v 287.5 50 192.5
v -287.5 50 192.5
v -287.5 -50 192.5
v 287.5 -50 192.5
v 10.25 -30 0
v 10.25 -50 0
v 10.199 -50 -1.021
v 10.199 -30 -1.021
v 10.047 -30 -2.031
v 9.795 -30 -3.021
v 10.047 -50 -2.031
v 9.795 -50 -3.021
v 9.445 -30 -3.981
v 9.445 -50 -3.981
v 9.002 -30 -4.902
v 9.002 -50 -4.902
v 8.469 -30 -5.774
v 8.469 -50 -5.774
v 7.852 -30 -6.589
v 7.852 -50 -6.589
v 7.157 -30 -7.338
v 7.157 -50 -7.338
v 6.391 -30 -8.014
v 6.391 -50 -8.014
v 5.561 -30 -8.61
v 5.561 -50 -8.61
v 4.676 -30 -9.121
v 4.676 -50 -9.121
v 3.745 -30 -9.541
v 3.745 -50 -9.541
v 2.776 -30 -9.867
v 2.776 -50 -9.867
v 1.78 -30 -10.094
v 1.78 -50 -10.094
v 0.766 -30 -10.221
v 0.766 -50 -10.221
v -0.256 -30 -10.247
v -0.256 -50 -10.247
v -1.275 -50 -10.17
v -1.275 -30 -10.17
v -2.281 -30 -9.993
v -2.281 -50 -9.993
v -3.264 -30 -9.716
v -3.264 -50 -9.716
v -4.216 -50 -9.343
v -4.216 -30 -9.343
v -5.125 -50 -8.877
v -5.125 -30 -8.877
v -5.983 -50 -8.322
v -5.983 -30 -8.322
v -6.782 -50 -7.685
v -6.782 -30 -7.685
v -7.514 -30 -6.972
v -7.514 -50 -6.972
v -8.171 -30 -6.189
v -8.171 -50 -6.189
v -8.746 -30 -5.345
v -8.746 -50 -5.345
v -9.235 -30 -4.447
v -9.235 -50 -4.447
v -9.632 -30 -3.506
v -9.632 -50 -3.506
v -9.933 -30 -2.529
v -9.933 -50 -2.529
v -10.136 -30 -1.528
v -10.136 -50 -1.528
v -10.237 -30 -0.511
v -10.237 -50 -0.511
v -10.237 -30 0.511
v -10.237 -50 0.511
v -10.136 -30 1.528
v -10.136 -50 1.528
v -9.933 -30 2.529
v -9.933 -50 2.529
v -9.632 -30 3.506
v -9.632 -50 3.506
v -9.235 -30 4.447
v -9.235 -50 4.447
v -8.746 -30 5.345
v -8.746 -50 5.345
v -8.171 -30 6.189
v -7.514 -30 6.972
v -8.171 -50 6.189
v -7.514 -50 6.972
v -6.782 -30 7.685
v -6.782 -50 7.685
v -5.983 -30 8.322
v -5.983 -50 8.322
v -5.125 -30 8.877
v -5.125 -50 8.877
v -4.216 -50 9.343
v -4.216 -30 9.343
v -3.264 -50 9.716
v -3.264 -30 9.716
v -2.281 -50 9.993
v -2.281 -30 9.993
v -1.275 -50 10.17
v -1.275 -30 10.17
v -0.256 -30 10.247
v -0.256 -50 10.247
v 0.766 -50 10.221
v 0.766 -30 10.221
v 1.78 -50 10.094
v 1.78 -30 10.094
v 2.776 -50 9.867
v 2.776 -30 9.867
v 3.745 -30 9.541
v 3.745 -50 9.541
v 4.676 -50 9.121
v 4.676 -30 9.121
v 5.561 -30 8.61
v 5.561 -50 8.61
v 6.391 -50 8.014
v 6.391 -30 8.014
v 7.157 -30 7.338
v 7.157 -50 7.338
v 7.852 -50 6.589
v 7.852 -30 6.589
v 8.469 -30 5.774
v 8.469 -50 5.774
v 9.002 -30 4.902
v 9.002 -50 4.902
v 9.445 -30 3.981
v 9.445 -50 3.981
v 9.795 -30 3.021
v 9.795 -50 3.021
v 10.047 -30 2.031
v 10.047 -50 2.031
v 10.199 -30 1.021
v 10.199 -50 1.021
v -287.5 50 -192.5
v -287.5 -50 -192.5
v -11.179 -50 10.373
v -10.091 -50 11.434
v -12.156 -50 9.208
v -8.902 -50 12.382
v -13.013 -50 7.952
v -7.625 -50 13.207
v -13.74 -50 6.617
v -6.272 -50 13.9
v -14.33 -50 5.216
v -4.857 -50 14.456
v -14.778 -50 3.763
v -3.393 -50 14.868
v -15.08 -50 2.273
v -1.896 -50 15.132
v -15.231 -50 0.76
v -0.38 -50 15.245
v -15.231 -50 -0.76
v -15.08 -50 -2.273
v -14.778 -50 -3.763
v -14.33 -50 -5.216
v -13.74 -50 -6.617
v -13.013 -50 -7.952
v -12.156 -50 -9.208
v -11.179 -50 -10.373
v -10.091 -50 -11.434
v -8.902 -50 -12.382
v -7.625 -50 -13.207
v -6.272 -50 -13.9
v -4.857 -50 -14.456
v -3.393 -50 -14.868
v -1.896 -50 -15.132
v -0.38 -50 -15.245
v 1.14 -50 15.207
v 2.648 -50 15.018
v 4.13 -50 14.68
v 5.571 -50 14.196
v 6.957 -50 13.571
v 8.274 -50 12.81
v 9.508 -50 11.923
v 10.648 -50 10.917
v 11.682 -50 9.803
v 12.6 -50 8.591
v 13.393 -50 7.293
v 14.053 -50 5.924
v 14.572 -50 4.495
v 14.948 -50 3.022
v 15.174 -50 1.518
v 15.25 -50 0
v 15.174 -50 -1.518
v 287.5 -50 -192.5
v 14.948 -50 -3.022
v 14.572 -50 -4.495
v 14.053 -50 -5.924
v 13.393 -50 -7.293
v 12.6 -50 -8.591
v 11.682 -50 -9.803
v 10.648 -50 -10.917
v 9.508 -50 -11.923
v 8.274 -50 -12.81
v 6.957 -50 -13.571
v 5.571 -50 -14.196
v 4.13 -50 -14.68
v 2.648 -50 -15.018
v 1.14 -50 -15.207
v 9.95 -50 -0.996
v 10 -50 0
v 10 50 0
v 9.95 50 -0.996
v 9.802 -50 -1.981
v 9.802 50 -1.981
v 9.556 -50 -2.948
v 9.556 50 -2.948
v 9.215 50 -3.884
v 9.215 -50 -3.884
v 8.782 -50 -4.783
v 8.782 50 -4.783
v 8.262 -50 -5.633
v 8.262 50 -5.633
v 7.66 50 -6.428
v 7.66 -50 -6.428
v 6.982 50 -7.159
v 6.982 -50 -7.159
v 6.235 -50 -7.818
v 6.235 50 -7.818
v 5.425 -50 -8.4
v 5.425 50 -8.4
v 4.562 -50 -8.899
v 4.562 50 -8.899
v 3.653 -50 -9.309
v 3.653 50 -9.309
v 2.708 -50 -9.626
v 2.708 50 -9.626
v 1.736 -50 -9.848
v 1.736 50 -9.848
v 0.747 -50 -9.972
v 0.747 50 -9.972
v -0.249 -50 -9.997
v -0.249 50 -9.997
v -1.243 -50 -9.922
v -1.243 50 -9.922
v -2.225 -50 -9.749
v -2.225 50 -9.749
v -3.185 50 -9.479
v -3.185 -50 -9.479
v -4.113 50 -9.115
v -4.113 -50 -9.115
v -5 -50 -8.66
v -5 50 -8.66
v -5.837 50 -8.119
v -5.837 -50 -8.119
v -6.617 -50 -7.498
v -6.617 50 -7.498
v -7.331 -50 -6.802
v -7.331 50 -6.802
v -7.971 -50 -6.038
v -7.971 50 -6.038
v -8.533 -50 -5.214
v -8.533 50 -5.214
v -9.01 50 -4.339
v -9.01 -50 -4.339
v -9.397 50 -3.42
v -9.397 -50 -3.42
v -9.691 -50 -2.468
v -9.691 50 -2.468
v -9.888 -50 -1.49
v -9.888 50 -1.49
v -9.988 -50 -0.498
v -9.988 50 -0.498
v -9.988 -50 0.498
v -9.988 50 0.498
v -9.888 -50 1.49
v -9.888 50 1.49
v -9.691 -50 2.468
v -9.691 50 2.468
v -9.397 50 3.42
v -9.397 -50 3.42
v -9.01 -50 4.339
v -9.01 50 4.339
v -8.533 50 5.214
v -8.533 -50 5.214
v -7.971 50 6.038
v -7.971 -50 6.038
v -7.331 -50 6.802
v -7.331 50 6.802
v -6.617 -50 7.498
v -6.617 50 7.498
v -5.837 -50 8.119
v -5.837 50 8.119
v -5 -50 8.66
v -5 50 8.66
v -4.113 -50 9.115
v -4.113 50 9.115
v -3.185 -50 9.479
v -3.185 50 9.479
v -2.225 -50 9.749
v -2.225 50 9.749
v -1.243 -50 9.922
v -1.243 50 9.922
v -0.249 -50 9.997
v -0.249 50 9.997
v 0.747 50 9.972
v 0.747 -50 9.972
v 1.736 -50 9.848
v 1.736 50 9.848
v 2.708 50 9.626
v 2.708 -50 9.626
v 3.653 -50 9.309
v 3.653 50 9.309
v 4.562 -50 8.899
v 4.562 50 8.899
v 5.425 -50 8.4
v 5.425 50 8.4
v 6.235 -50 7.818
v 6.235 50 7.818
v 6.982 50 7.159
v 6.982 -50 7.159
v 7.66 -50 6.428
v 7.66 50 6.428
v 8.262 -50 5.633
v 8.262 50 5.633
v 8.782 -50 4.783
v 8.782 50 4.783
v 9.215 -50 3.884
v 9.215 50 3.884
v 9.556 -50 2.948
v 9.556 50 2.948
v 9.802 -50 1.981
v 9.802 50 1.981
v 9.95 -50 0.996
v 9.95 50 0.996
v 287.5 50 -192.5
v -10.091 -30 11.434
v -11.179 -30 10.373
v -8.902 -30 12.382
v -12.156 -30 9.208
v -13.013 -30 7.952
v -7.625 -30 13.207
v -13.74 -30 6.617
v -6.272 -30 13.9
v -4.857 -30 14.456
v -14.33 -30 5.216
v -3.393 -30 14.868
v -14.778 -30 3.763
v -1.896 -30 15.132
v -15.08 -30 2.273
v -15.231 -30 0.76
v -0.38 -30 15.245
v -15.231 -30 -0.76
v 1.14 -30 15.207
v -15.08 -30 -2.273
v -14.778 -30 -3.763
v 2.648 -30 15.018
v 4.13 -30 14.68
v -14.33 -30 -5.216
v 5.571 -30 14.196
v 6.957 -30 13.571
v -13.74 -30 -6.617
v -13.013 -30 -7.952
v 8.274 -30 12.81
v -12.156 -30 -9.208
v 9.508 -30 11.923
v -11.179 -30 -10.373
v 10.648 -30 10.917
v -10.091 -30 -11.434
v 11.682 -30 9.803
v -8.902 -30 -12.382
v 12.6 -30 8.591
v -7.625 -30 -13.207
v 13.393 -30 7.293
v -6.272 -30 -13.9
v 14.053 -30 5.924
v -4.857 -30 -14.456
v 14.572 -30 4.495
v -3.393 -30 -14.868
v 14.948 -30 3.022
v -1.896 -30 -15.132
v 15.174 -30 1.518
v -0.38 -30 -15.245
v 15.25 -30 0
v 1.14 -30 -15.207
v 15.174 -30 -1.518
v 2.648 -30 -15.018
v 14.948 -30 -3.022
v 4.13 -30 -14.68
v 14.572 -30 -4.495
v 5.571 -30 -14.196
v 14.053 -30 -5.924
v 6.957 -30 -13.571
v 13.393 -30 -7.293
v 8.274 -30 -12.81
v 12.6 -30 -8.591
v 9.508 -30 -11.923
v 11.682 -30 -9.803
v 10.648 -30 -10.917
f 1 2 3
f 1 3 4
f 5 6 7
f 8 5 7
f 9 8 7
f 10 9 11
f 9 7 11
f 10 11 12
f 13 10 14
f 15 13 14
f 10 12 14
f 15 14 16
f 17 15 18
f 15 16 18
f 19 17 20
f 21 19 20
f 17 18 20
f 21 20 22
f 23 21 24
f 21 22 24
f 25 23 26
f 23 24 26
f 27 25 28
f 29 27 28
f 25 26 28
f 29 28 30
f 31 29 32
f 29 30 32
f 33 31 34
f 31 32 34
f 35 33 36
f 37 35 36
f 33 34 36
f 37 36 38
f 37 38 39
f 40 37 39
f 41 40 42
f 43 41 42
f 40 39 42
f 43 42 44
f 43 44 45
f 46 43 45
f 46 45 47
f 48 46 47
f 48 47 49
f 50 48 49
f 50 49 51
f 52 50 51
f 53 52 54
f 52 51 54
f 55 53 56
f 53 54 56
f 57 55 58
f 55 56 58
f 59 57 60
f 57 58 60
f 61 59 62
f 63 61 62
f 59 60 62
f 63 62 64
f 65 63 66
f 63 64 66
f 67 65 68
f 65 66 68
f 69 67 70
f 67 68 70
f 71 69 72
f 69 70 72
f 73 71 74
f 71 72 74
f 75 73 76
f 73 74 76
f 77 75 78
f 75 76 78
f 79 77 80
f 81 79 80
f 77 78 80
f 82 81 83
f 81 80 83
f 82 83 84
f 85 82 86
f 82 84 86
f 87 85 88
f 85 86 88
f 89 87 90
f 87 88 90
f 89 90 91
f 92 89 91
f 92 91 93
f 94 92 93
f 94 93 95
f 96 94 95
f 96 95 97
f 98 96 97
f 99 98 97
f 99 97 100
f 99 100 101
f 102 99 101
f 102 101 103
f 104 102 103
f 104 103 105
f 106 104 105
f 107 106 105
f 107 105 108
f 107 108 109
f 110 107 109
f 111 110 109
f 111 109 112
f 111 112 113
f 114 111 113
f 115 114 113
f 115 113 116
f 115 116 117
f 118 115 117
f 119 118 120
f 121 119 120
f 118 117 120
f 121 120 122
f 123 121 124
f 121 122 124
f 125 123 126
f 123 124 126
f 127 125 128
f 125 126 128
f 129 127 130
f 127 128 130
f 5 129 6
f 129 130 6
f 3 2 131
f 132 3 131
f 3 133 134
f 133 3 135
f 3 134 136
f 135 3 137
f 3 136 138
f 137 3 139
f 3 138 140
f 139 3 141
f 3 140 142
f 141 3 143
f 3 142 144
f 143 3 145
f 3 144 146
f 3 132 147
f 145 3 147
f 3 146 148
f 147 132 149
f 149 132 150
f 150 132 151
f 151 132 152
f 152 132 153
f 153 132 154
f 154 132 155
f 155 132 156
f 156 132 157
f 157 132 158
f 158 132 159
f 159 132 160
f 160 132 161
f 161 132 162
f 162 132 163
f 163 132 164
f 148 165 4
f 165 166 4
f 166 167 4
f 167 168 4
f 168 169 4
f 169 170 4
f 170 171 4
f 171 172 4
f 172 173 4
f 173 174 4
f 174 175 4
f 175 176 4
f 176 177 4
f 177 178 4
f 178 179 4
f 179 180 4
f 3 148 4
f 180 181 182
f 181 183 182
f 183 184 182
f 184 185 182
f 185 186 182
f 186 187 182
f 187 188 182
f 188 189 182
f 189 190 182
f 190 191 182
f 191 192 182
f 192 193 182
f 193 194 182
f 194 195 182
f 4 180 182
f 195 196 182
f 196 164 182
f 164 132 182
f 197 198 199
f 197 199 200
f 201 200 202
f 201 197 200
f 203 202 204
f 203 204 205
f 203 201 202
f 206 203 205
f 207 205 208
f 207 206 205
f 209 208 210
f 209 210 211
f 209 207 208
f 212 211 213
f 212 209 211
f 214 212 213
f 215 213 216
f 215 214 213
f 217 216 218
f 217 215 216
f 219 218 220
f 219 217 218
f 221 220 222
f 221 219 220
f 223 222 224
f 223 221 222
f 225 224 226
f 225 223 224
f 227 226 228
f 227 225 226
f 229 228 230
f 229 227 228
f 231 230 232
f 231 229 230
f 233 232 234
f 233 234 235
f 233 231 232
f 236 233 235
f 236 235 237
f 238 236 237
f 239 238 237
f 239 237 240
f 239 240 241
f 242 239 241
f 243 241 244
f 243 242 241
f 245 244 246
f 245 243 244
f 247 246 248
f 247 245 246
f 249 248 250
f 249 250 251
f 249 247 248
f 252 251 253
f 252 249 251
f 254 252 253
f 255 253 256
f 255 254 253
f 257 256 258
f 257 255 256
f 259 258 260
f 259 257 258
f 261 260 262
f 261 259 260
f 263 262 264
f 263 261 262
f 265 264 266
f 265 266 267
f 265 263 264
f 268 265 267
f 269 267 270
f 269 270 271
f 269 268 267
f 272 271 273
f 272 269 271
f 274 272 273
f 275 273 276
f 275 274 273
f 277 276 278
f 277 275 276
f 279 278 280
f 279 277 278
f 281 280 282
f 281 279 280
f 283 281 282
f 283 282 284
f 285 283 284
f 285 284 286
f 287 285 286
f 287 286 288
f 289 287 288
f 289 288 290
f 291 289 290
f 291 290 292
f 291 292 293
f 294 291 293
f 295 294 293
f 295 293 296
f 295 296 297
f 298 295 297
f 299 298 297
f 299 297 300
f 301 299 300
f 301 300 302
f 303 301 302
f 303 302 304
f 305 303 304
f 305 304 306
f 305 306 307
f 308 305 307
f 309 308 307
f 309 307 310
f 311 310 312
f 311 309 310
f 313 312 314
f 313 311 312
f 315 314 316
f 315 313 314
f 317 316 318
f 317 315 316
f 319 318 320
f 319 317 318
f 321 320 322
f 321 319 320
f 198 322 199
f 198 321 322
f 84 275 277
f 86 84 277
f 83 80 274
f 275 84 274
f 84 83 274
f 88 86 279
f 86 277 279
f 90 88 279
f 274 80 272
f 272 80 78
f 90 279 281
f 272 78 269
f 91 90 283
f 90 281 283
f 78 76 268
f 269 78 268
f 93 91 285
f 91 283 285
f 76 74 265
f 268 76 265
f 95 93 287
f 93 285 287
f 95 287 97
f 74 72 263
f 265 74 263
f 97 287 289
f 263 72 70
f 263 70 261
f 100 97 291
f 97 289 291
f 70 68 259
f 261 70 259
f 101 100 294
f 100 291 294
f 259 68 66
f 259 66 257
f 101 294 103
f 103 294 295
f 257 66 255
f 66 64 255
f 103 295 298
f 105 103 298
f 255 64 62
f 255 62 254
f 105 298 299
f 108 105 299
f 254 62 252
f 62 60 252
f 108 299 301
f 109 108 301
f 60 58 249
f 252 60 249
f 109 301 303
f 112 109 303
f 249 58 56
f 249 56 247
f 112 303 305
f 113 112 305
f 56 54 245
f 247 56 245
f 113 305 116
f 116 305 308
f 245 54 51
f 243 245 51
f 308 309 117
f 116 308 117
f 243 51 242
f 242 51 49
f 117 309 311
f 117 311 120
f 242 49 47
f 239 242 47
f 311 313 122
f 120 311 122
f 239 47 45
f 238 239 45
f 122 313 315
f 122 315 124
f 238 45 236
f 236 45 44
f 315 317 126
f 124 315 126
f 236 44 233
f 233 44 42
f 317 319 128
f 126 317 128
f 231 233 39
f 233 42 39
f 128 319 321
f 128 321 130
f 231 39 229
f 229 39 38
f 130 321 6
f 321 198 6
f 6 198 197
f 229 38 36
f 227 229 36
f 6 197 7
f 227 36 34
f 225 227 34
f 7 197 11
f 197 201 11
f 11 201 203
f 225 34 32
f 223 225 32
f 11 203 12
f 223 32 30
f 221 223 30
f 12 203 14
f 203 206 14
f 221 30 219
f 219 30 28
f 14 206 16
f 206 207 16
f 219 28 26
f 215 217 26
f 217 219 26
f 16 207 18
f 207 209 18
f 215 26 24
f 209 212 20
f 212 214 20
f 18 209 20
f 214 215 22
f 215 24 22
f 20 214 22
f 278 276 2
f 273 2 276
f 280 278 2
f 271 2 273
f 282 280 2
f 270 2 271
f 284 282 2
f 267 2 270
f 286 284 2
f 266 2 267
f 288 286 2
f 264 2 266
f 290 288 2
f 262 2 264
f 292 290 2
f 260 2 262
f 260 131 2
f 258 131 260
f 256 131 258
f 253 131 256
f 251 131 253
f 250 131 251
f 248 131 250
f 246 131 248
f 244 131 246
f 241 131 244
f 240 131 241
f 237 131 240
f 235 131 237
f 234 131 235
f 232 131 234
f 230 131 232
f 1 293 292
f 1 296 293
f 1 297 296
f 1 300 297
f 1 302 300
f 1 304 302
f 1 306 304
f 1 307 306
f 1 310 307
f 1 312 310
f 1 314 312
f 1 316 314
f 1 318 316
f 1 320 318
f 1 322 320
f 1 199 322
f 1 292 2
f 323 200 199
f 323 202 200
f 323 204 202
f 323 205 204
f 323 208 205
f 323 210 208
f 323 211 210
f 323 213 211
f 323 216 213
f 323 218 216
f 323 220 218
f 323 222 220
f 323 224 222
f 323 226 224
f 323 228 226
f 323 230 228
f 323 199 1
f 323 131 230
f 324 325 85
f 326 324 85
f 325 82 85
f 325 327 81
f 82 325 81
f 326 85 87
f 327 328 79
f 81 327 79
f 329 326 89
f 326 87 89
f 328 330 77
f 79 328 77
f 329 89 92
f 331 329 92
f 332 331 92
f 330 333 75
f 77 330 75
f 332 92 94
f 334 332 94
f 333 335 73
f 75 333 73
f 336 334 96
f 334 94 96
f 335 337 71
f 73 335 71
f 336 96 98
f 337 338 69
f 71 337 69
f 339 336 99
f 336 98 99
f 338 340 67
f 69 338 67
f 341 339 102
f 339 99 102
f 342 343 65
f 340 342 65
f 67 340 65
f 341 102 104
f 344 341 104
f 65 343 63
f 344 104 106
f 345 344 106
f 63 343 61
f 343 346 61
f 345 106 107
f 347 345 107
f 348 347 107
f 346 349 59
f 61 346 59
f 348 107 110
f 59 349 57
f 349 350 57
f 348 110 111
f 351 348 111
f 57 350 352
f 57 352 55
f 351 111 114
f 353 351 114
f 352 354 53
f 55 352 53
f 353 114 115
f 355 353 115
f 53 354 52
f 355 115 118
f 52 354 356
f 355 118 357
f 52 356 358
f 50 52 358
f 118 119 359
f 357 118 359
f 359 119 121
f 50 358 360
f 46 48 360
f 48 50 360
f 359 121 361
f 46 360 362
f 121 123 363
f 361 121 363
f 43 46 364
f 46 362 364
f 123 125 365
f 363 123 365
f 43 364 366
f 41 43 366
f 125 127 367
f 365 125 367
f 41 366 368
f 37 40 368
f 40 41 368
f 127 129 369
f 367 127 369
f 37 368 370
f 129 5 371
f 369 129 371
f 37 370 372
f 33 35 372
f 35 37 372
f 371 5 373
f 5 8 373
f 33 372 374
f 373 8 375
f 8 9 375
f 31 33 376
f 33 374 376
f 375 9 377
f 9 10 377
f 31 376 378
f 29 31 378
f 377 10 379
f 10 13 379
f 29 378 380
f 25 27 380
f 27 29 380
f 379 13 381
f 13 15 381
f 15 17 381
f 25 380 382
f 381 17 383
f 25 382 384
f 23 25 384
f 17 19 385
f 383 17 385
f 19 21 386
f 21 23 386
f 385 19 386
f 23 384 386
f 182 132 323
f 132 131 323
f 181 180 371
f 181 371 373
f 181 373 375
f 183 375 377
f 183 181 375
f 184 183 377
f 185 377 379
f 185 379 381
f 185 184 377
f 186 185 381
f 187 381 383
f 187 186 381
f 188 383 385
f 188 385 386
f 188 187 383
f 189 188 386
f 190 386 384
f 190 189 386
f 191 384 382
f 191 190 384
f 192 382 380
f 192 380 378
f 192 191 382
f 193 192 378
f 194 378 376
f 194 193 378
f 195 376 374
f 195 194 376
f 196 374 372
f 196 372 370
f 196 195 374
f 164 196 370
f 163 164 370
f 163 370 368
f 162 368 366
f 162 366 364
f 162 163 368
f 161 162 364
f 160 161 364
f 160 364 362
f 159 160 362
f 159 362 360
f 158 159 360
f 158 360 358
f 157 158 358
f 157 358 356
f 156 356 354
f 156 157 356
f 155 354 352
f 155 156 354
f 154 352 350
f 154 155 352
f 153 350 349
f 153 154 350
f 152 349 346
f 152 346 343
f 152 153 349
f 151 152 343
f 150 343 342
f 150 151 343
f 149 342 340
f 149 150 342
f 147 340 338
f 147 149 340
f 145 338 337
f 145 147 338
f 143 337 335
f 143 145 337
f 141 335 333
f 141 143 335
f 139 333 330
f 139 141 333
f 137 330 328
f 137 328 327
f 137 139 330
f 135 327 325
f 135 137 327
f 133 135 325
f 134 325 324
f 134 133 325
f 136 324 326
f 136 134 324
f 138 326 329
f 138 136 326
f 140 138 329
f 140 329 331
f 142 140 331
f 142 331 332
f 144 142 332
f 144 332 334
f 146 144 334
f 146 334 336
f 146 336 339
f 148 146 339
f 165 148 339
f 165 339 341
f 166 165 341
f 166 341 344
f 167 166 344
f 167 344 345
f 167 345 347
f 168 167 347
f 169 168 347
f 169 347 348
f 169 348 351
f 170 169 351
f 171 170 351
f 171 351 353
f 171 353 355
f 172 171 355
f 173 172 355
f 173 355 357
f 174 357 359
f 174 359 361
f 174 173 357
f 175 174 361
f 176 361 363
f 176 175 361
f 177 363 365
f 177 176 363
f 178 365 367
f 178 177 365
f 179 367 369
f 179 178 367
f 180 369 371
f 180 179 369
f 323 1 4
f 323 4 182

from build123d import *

# Parameters (mm, degrees)
SKETCH1_W             = 575
SKETCH1_H             = 385
BOSS_EXTRUDE1_DEPTH   = 50
CAVITY2_START         = -50
CAVITY2_OUTLINE_R     = 10
CAVITY2_DEPTH         = 100
CAVITY2_2_OUTLINE_R   = 15.25
CAVITY2_2_OUTLINE_R_2 = 10.25
CAVITY2_2_DEPTH       = 20


# Read off the part's stored shape, not the designer's step: Cavity2
with BuildPart() as part:
    # Sketch1 → Boss-Extrude1 (new, symmetric)
    with BuildSketch(Plane(origin=(0, 0, 0), x_dir=(1, 0, 0), z_dir=(0, 1, 0))):
        Rectangle(SKETCH1_W, SKETCH1_H)
    extrude(amount=BOSS_EXTRUDE1_DEPTH, both=True)

    # Cavity2 outline → Cavity2 (cut)
    with BuildSketch(Plane(origin=(0, 0, 0), x_dir=(1, 0, 0), z_dir=(0, 1, 0)).offset(CAVITY2_START)):
        Circle(CAVITY2_OUTLINE_R)
    extrude(amount=CAVITY2_DEPTH, mode=Mode.SUBTRACT)

    # Cavity2 2 outline → Cavity2 2 (cut)
    with BuildSketch(Plane(origin=(0, 0, 0), x_dir=(1, 0, 0), z_dir=(0, 1, 0)).offset(CAVITY2_START)):
        Circle(CAVITY2_2_OUTLINE_R)
        Circle(CAVITY2_2_OUTLINE_R_2, mode=Mode.SUBTRACT)
    extrude(amount=CAVITY2_2_DEPTH, mode=Mode.SUBTRACT)


solid = part.part
